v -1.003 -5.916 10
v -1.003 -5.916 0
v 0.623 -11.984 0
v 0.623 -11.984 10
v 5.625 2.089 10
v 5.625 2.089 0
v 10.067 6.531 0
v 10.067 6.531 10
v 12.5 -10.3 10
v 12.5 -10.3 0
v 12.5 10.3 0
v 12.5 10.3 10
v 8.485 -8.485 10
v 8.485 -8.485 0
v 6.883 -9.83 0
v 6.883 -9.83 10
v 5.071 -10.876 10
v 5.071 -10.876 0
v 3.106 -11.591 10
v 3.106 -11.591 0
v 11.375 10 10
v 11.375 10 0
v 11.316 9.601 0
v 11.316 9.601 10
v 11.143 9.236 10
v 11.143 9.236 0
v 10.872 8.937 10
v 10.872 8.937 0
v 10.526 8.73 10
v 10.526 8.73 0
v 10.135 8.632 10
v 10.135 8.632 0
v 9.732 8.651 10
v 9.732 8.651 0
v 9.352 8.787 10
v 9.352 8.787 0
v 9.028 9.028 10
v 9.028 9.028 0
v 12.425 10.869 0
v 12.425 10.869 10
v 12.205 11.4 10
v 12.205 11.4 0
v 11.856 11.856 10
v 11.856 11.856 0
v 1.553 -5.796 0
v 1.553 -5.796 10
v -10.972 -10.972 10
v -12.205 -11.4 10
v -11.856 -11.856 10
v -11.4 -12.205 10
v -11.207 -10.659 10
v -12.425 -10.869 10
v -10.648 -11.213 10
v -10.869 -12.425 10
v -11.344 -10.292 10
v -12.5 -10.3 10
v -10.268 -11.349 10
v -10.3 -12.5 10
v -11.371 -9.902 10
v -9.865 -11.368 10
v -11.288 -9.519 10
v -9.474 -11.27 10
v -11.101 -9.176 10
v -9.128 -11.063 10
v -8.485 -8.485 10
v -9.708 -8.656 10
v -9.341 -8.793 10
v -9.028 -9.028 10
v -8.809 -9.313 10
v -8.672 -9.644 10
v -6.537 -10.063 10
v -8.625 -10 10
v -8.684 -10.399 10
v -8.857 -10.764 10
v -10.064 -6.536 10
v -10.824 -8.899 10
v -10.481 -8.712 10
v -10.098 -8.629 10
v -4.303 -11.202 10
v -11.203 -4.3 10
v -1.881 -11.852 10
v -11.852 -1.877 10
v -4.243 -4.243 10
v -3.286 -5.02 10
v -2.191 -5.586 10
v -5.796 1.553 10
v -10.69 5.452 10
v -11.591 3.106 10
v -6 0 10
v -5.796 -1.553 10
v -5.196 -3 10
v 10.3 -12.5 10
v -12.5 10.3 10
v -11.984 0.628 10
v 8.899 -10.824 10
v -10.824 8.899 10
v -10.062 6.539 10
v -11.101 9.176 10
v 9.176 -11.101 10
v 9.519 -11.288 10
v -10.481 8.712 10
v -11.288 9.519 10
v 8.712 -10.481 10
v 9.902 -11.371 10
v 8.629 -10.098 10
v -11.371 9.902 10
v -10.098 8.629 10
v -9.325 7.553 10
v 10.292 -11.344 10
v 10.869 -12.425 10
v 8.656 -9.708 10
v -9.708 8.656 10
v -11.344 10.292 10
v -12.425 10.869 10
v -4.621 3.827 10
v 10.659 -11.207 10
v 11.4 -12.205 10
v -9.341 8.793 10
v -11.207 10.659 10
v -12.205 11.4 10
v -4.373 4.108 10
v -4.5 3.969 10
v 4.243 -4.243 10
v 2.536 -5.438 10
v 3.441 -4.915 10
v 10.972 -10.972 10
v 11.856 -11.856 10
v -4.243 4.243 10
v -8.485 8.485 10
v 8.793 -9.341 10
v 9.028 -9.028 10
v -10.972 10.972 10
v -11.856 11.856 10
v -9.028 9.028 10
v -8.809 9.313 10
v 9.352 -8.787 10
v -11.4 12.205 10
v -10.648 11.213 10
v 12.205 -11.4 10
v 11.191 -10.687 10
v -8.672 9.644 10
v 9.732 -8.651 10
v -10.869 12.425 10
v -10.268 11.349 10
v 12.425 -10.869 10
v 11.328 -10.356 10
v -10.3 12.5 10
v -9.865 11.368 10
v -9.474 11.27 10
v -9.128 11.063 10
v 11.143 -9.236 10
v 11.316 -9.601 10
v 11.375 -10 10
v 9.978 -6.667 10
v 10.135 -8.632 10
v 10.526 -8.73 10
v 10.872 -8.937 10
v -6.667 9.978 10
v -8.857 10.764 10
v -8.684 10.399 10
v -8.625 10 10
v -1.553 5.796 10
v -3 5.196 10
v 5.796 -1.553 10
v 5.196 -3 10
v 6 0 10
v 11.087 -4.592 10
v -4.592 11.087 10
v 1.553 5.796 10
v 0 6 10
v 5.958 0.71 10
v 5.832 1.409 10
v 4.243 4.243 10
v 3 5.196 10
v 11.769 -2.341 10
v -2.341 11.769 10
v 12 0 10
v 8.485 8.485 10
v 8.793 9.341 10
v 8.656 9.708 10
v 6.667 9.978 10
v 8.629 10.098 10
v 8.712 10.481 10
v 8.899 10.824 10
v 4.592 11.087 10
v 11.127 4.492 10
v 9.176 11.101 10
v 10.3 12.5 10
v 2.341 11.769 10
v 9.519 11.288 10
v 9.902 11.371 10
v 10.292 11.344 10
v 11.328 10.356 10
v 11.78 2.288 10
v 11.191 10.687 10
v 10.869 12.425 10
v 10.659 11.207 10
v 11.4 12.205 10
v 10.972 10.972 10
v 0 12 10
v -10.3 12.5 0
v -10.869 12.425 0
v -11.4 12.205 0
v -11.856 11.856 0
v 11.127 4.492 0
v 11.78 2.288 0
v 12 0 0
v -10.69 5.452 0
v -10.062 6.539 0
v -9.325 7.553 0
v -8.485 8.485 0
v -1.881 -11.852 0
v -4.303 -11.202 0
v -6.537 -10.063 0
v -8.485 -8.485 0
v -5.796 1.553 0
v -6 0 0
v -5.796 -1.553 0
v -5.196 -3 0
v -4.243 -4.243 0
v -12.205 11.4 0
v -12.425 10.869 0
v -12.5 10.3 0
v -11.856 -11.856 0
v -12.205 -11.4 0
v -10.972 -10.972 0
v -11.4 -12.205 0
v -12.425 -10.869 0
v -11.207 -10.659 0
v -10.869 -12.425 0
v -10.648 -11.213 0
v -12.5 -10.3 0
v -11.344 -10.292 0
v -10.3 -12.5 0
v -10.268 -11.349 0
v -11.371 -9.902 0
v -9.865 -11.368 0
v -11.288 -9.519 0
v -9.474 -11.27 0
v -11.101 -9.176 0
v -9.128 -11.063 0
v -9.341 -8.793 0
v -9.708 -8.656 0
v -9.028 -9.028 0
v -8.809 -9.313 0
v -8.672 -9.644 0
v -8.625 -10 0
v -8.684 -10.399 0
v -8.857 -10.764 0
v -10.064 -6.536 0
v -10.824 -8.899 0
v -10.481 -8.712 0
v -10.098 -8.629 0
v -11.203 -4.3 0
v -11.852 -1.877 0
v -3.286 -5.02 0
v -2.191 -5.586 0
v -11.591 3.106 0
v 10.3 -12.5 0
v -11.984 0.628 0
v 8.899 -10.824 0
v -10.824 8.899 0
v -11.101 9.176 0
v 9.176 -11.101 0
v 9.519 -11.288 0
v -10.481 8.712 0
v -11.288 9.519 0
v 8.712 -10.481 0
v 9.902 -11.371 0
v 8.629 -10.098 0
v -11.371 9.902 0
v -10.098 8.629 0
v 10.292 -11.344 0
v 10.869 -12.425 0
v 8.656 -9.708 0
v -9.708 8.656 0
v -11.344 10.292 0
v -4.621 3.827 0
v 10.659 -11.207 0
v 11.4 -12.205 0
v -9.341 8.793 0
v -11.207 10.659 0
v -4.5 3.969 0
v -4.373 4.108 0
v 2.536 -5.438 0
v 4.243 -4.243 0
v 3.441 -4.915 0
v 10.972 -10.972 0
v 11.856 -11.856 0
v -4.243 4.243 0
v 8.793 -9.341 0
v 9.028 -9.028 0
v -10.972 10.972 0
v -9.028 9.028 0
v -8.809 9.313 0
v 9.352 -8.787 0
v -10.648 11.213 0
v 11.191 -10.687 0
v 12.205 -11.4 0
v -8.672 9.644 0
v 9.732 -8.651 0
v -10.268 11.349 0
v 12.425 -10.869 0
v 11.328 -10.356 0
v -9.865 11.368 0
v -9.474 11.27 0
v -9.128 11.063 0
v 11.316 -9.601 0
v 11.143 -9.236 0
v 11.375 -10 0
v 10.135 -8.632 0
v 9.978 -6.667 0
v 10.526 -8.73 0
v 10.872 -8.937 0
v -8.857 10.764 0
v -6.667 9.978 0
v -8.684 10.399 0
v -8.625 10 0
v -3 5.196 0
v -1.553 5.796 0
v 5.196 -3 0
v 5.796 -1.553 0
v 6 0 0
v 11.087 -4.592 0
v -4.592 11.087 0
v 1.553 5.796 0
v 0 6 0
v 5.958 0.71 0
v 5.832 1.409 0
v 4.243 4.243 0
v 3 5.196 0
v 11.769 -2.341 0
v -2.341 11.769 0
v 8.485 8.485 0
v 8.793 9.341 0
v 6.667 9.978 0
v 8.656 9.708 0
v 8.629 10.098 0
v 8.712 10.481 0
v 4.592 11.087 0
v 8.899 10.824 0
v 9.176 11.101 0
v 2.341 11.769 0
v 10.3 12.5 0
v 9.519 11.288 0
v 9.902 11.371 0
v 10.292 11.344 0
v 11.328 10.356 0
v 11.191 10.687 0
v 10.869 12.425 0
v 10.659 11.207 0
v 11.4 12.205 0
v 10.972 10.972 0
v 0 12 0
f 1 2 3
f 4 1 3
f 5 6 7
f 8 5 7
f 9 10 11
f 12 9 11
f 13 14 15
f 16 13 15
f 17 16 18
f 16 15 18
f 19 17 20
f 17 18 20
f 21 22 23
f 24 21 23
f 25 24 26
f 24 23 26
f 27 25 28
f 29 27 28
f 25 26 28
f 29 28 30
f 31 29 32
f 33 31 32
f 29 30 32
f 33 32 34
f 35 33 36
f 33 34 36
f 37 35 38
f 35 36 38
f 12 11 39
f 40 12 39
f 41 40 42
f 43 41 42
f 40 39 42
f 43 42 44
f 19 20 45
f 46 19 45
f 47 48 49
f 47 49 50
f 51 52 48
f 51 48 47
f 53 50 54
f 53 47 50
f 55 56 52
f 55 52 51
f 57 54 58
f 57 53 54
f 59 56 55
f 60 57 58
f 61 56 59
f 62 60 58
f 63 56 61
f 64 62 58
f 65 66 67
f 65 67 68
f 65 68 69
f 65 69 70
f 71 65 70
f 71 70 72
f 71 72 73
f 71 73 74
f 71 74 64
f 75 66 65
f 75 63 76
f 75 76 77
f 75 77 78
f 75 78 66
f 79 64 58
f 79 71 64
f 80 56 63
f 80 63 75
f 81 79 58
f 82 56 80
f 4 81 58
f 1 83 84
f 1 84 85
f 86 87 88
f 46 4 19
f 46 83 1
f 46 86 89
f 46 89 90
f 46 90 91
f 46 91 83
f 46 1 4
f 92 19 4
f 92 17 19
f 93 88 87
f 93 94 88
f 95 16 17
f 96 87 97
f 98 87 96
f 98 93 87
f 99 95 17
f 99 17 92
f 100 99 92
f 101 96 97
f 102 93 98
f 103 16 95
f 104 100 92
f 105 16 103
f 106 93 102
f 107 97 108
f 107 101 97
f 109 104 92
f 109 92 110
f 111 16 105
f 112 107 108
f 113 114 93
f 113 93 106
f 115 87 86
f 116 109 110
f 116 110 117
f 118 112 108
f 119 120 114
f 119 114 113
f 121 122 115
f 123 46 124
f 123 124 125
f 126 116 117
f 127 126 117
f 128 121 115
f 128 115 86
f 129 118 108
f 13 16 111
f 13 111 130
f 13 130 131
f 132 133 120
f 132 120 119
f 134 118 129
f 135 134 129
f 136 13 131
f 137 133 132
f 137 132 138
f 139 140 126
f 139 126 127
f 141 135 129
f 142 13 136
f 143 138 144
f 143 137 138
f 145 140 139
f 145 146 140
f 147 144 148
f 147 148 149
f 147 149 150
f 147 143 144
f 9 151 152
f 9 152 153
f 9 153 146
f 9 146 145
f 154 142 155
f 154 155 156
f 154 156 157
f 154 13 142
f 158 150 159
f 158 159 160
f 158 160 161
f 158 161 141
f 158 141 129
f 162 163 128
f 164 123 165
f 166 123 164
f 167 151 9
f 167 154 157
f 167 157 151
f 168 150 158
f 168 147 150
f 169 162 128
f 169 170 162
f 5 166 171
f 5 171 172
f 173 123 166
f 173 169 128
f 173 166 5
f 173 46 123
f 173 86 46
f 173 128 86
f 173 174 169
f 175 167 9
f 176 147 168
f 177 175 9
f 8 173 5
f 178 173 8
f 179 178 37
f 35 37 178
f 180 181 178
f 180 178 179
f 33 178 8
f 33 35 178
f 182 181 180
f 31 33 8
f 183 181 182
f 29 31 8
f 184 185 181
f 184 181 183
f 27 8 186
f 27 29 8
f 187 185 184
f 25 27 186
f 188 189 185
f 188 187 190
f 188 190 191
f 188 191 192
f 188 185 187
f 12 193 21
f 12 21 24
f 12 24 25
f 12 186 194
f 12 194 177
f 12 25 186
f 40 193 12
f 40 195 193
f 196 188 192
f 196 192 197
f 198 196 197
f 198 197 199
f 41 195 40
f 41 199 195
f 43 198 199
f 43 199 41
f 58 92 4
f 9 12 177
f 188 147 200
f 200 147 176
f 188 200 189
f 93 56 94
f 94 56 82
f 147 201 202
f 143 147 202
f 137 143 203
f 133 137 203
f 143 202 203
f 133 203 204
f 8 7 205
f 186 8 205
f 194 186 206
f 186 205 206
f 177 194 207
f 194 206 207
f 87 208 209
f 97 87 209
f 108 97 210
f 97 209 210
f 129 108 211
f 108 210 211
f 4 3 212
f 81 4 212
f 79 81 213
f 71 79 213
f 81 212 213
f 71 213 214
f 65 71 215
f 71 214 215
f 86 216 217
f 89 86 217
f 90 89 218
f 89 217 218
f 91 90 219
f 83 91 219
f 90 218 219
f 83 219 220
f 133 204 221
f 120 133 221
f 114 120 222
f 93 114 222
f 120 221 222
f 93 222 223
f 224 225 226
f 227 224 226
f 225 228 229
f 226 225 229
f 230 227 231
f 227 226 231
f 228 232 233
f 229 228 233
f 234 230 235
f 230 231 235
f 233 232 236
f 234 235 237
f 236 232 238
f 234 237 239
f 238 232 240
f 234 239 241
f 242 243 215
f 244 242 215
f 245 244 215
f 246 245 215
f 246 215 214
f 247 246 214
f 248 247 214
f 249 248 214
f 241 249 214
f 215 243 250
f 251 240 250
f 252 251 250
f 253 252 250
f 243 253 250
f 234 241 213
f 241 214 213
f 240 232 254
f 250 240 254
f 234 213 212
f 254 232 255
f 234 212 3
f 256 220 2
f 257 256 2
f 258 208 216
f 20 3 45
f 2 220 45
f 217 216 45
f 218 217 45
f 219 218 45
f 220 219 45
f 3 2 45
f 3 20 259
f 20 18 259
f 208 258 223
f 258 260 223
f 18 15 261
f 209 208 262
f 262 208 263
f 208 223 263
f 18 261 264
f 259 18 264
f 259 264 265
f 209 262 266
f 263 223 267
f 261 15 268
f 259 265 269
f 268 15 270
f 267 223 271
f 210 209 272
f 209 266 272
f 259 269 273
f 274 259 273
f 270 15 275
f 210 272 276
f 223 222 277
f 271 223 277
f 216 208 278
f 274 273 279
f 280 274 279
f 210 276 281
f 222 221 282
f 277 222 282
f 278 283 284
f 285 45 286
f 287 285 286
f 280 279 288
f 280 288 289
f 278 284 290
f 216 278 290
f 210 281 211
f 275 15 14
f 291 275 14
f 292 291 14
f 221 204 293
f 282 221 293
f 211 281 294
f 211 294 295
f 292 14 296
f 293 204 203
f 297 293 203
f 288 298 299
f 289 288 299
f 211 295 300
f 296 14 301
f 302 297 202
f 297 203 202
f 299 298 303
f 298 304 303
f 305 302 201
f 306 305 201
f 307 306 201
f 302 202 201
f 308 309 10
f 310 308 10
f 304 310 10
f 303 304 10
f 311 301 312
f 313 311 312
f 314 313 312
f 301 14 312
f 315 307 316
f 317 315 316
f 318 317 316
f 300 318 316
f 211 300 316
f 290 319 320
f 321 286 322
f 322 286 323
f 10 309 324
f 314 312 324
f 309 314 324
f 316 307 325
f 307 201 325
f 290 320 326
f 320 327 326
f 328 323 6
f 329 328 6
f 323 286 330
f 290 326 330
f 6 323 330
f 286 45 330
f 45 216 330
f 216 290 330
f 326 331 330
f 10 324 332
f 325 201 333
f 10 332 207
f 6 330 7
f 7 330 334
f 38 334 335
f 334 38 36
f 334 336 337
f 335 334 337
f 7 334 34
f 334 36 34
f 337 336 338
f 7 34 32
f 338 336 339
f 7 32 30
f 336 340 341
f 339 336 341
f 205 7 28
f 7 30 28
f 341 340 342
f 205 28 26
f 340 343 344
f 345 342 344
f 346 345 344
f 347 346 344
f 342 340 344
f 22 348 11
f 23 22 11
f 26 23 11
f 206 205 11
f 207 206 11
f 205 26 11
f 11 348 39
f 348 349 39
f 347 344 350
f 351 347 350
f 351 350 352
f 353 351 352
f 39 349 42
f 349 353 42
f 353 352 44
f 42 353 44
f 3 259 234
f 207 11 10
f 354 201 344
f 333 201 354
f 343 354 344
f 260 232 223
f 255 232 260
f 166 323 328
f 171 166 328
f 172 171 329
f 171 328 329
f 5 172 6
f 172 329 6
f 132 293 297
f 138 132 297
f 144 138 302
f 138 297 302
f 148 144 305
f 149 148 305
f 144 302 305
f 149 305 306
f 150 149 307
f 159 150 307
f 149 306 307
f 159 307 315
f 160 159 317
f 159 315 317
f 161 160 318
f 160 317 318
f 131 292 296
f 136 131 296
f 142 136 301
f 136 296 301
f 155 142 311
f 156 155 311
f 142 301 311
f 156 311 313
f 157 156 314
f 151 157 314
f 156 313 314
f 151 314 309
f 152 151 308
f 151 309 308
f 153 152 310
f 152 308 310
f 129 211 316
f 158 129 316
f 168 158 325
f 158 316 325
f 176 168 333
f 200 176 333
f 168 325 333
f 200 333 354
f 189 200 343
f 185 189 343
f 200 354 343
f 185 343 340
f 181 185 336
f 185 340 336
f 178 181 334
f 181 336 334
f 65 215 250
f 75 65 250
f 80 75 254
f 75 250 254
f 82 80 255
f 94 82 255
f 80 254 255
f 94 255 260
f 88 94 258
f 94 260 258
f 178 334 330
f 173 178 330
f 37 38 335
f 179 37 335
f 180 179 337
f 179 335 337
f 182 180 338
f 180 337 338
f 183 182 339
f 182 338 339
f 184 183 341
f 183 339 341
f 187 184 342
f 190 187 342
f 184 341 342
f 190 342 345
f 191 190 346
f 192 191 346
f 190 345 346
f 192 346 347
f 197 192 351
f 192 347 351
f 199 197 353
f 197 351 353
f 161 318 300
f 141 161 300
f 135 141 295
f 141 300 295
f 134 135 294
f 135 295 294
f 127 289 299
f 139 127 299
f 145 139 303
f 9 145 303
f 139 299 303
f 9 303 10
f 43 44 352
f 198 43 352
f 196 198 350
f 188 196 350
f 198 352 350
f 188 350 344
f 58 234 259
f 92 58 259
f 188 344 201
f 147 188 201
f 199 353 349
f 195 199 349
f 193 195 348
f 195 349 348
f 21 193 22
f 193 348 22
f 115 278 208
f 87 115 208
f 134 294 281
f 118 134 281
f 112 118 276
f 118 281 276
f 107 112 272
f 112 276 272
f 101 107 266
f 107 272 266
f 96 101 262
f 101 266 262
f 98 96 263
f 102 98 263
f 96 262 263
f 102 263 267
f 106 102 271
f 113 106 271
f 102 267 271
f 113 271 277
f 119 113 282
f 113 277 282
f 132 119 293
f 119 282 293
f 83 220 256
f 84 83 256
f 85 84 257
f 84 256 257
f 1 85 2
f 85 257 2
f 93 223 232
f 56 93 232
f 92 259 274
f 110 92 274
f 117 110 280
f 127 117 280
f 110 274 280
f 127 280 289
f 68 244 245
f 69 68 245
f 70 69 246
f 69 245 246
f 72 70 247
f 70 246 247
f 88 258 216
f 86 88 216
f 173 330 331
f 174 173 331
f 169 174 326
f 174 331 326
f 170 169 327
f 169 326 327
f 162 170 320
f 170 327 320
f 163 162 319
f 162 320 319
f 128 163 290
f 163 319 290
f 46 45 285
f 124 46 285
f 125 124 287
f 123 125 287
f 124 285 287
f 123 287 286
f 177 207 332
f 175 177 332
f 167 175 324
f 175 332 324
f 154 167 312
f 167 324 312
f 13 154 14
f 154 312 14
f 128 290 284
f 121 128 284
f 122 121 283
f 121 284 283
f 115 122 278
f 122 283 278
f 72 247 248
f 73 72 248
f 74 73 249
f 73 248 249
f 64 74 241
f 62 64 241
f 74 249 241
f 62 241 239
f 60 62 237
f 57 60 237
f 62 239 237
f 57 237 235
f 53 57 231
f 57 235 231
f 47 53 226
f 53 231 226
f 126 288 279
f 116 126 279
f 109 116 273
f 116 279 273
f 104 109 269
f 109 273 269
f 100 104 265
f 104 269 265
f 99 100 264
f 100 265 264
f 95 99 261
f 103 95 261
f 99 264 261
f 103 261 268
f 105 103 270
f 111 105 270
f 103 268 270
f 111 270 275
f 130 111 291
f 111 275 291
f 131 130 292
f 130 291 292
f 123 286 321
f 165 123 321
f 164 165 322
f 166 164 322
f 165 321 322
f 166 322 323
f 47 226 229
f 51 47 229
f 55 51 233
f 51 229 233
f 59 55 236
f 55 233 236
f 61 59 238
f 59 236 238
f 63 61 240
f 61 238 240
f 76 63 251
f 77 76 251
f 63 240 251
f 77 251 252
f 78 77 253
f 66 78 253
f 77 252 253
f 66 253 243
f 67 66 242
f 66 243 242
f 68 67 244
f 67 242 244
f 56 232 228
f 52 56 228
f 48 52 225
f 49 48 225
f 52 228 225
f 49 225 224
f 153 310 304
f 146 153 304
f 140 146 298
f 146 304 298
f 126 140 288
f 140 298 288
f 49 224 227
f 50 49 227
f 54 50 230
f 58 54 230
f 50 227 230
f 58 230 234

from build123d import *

# Parameters (mm, degrees)
F1_DEPTH = 10


with BuildPart() as f1:
    # F0 (on Top) → F1 (new body)
    with BuildSketch(Plane.XY):
        with BuildLine():
            ThreePointArc((-12.5, -10.3), (-12.3325349715, -11.1419035512), (-11.8556349186, -11.8556349186))
            Line((-11.8556349186, -11.8556349186), (-10.9722718241, -10.9722718241))
            ThreePointArc((-10.9722718241, -10.9722718241), (-10.9722718241, -9.0277281759), (-9.0277281759, -9.0277281759))
            Line((-9.0277281759, -9.0277281759), (-8.4852813742, -8.4852813742))
            ThreePointArc((-8.4852813742, -8.4852813742), (-11.5911099155, -3.1058285412), (-11.5911099155, 3.1058285412))
            ThreePointArc((-11.5911099155, 3.1058285412), (-11.2020379419, 4.3028299931), (-10.6897288112, 5.4524946533))
            ThreePointArc((-10.6897288112, 5.4524946533), (-9.7066834051, 7.0555153797), (-8.4852813742, 8.4852813742))
            Line((-8.4852813742, 8.4852813742), (-9.0277281759, 9.0277281759))
            ThreePointArc((-9.0277281759, 9.0277281759), (-10.9722718241, 9.0277281759), (-10.9722718241, 10.9722718241))
            Line((-10.9722718241, 10.9722718241), (-11.8556349186, 11.8556349186))
            ThreePointArc((-11.8556349186, 11.8556349186), (-12.3325349715, 11.1419035512), (-12.5, 10.3))
            Line((-12.5, 10.3), (-12.5, -10.3))
        make_face()
        with BuildLine():
            Line((-10.3, -12.5), (10.3, -12.5))
            ThreePointArc((10.3, -12.5), (11.1419035512, -12.3325349715), (11.8556349186, -11.8556349186))
            Line((11.8556349186, -11.8556349186), (10.9722718241, -10.9722718241))
            ThreePointArc((10.9722718241, -10.9722718241), (9.0277281759, -10.9722718241), (9.0277281759, -9.0277281759))
            Line((9.0277281759, -9.0277281759), (8.4852813742, -8.4852813742))
            ThreePointArc((8.4852813742, -8.4852813742), (6, -10.3923048454), (3.1058285412, -11.5911099155))
            ThreePointArc((3.1058285412, -11.5911099155), (1.8746588888, -11.8526644283), (0.6228655218, -11.9838240367))
            ThreePointArc((0.6228655218, -11.9838240367), (-4.3028299931, -11.2020379419), (-8.4852813742, -8.4852813742))
            Line((-8.4852813742, -8.4852813742), (-9.0277281759, -9.0277281759))
            ThreePointArc((-9.0277281759, -9.0277281759), (-8.7296656428, -9.4738102805), (-8.625, -10))
            ThreePointArc((-8.625, -10), (-9.4738102805, -11.2703343572), (-10.9722718241, -10.9722718241))
            Line((-10.9722718241, -10.9722718241), (-11.8556349186, -11.8556349186))
            ThreePointArc((-11.8556349186, -11.8556349186), (-11.1419035512, -12.3325349715), (-10.3, -12.5))
        make_face()
        with BuildLine():
            Line((10.9722718241, -10.9722718241), (11.8556349186, -11.8556349186))
            ThreePointArc((11.8556349186, -11.8556349186), (12.3325349715, -11.1419035512), (12.5, -10.3))
            Line((12.5, -10.3), (12.5, 10.3))
            ThreePointArc((12.5, 10.3), (12.3325349715, 11.1419035512), (11.8556349186, 11.8556349186))
            Line((11.8556349186, 11.8556349186), (10.9722718241, 10.9722718241))
            ThreePointArc((10.9722718241, 10.9722718241), (11.2703343572, 10.5261897195), (11.375, 10))
            ThreePointArc((11.375, 10), (10.5261897195, 8.7296656428), (9.0277281759, 9.0277281759))
            Line((9.0277281759, 9.0277281759), (8.4852813742, 8.4852813742))
            ThreePointArc((8.4852813742, 8.4852813742), (9.3273790531, 7.5498344353), (10.0668632893, 6.5313293834))
            ThreePointArc((10.0668632893, 6.5313293834), (11.5065711546, 3.4057040776), (12, 0))
            ThreePointArc((12, 0), (11.0865543901, -4.5922011884), (8.4852813742, -8.4852813742))
            Line((8.4852813742, -8.4852813742), (9.0277281759, -9.0277281759))
            ThreePointArc((9.0277281759, -9.0277281759), (10.5261897195, -8.7296656428), (11.375, -10))
            ThreePointArc((11.375, -10), (11.2703343572, -10.5261897195), (10.9722718241, -10.9722718241))
        make_face()
        with BuildLine():
            Line((10.9722718241, 10.9722718241), (11.8556349186, 11.8556349186))
            ThreePointArc((11.8556349186, 11.8556349186), (11.1419035512, 12.3325349715), (10.3, 12.5))
            Line((10.3, 12.5), (-10.3, 12.5))
            ThreePointArc((-10.3, 12.5), (-11.1419035512, 12.3325349715), (-11.8556349186, 11.8556349186))
            Line((-11.8556349186, 11.8556349186), (-10.9722718241, 10.9722718241))
            ThreePointArc((-10.9722718241, 10.9722718241), (-9.4738102805, 11.2703343572), (-8.625, 10))
            ThreePointArc((-8.625, 10), (-8.7296656428, 9.4738102805), (-9.0277281759, 9.0277281759))
            Line((-9.0277281759, 9.0277281759), (-8.4852813742, 8.4852813742))
            ThreePointArc((-8.4852813742, 8.4852813742), (0, 12), (8.4852813742, 8.4852813742))
            Line((8.4852813742, 8.4852813742), (9.0277281759, 9.0277281759))
            ThreePointArc((9.0277281759, 9.0277281759), (9.0277281759, 10.9722718241), (10.9722718241, 10.9722718241))
        make_face()
        with BuildLine():
            ThreePointArc((-10.6897288112, 5.4524946533), (-11.2020379419, 4.3028299931), (-11.5911099155, 3.1058285412))
            Line((-11.5911099155, 3.1058285412), (-5.7955549577, 1.5529142706))
            ThreePointArc((-5.7955549577, 1.5529142706), (-5.3311192747, 2.7530287465), (-4.6214557688, 3.8265057921))
            Line((-4.6214557688, 3.8265057921), (-10.6897288112, 5.4524946533))
        make_face()
        with BuildLine():
            Line((-5.7955549577, 1.5529142706), (0, 0))
            Line((0, 0), (-4.2426406871, 4.2426406871))
            ThreePointArc((-4.2426406871, 4.2426406871), (-4.4369295191, 4.0390167668), (-4.6214557688, 3.8265057921))
            ThreePointArc((-4.6214557688, 3.8265057921), (-5.3311192747, 2.7530287465), (-5.7955549577, 1.5529142706))
        make_face()
        with BuildLine():
            Line((-4.2426406871, 4.2426406871), (0, 0))
            Line((0, 0), (4.2426406871, 4.2426406871))
            ThreePointArc((4.2426406871, 4.2426406871), (0, 6), (-4.2426406871, 4.2426406871))
        make_face()
        with BuildLine():
            Line((0, 0), (4.2426406871, -4.2426406871))
            ThreePointArc((4.2426406871, -4.2426406871), (5.5432771951, -2.2961005942), (6, 0))
            ThreePointArc((6, 0), (5.9053989979, 1.0612552359), (5.6245791081, 2.0890452022))
            ThreePointArc((5.6245791081, 2.0890452022), (5.0497524692, 3.2403703492), (4.2426406871, 4.2426406871))
            Line((4.2426406871, 4.2426406871), (0, 0))
        make_face()
        with BuildLine():
            Line((5.6245791081, 2.0890452022), (10.0668632893, 6.5313293834))
            ThreePointArc((10.0668632893, 6.5313293834), (9.3273790531, 7.5498344353), (8.4852813742, 8.4852813742))
            Line((8.4852813742, 8.4852813742), (4.2426406871, 4.2426406871))
            ThreePointArc((4.2426406871, 4.2426406871), (5.0497524692, 3.2403703492), (5.6245791081, 2.0890452022))
        make_face()
        with BuildLine():
            ThreePointArc((1.5529142706, -5.7955549577), (3, -5.1961524227), (4.2426406871, -4.2426406871))
            Line((4.2426406871, -4.2426406871), (0, 0))
            Line((0, 0), (1.5529142706, -5.7955549577))
        make_face()
        with BuildLine():
            Line((0, 0), (-4.2426406871, -4.2426406871))
            ThreePointArc((-4.2426406871, -4.2426406871), (-2.7530287465, -5.3311192747), (-1.0031233393, -5.9155509943))
            ThreePointArc((-1.0031233393, -5.9155509943), (0.2813668055, -5.9933990957), (1.5529142706, -5.7955549577))
            Line((1.5529142706, -5.7955549577), (0, 0))
        make_face()
        with BuildLine():
            ThreePointArc((-5.7955549577, 1.5529142706), (-5.7955549577, -1.5529142706), (-4.2426406871, -4.2426406871))
            Line((-4.2426406871, -4.2426406871), (0, 0))
            Line((0, 0), (-5.7955549577, 1.5529142706))
        make_face()
        with BuildLine():
            ThreePointArc((0.6228655218, -11.9838240367), (1.8746588888, -11.8526644283), (3.1058285412, -11.5911099155))
            Line((3.1058285412, -11.5911099155), (1.5529142706, -5.7955549577))
            ThreePointArc((1.5529142706, -5.7955549577), (0.2813668055, -5.9933990957), (-1.0031233393, -5.9155509943))
            Line((-1.0031233393, -5.9155509943), (0.6228655218, -11.9838240367))
        make_face()
    extrude(amount=F1_DEPTH)


solid = f1.part
